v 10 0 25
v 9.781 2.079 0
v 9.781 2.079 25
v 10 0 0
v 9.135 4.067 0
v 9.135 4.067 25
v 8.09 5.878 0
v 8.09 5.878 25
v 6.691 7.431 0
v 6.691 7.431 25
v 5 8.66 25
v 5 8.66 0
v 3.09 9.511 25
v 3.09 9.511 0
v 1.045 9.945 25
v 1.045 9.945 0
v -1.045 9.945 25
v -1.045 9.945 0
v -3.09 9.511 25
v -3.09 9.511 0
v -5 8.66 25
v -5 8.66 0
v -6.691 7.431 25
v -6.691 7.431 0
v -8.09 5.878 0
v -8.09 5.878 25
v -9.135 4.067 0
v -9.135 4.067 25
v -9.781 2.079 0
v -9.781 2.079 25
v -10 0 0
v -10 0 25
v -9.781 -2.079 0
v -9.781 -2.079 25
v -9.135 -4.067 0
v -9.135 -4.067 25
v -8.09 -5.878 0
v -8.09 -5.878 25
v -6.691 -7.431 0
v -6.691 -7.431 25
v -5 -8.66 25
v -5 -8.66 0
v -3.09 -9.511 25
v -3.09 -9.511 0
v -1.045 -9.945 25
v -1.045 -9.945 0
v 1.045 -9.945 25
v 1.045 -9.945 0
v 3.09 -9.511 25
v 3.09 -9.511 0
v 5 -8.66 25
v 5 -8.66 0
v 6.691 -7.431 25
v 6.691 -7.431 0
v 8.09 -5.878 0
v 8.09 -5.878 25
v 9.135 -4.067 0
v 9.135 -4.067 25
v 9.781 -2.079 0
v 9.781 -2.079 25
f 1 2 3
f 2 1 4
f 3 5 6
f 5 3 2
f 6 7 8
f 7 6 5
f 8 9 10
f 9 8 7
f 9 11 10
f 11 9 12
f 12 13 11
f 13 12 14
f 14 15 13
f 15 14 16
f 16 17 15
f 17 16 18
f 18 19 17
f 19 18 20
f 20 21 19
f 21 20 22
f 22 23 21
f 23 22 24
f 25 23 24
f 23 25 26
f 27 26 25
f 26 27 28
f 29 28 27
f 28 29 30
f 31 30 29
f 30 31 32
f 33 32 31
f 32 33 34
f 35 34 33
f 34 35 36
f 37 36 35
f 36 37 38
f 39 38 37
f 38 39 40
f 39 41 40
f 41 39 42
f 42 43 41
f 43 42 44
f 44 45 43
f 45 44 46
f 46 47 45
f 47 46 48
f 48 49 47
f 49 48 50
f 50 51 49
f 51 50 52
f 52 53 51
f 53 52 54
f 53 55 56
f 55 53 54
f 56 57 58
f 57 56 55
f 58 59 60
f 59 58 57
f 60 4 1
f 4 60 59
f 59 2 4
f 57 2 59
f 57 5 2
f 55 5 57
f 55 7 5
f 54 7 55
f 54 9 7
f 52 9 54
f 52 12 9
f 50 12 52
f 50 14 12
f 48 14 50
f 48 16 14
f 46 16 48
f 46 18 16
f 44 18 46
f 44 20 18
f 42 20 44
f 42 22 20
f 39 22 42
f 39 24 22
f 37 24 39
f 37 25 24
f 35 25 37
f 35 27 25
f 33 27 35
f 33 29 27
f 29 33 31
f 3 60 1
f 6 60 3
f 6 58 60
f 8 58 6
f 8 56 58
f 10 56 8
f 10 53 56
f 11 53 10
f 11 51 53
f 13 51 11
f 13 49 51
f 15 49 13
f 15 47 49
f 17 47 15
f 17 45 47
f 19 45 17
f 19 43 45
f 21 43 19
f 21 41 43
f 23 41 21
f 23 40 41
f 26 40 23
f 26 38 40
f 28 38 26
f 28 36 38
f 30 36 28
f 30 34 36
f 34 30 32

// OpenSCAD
// Generated by generate_scads.py
cylinder(h=25, r=10, center=false);
